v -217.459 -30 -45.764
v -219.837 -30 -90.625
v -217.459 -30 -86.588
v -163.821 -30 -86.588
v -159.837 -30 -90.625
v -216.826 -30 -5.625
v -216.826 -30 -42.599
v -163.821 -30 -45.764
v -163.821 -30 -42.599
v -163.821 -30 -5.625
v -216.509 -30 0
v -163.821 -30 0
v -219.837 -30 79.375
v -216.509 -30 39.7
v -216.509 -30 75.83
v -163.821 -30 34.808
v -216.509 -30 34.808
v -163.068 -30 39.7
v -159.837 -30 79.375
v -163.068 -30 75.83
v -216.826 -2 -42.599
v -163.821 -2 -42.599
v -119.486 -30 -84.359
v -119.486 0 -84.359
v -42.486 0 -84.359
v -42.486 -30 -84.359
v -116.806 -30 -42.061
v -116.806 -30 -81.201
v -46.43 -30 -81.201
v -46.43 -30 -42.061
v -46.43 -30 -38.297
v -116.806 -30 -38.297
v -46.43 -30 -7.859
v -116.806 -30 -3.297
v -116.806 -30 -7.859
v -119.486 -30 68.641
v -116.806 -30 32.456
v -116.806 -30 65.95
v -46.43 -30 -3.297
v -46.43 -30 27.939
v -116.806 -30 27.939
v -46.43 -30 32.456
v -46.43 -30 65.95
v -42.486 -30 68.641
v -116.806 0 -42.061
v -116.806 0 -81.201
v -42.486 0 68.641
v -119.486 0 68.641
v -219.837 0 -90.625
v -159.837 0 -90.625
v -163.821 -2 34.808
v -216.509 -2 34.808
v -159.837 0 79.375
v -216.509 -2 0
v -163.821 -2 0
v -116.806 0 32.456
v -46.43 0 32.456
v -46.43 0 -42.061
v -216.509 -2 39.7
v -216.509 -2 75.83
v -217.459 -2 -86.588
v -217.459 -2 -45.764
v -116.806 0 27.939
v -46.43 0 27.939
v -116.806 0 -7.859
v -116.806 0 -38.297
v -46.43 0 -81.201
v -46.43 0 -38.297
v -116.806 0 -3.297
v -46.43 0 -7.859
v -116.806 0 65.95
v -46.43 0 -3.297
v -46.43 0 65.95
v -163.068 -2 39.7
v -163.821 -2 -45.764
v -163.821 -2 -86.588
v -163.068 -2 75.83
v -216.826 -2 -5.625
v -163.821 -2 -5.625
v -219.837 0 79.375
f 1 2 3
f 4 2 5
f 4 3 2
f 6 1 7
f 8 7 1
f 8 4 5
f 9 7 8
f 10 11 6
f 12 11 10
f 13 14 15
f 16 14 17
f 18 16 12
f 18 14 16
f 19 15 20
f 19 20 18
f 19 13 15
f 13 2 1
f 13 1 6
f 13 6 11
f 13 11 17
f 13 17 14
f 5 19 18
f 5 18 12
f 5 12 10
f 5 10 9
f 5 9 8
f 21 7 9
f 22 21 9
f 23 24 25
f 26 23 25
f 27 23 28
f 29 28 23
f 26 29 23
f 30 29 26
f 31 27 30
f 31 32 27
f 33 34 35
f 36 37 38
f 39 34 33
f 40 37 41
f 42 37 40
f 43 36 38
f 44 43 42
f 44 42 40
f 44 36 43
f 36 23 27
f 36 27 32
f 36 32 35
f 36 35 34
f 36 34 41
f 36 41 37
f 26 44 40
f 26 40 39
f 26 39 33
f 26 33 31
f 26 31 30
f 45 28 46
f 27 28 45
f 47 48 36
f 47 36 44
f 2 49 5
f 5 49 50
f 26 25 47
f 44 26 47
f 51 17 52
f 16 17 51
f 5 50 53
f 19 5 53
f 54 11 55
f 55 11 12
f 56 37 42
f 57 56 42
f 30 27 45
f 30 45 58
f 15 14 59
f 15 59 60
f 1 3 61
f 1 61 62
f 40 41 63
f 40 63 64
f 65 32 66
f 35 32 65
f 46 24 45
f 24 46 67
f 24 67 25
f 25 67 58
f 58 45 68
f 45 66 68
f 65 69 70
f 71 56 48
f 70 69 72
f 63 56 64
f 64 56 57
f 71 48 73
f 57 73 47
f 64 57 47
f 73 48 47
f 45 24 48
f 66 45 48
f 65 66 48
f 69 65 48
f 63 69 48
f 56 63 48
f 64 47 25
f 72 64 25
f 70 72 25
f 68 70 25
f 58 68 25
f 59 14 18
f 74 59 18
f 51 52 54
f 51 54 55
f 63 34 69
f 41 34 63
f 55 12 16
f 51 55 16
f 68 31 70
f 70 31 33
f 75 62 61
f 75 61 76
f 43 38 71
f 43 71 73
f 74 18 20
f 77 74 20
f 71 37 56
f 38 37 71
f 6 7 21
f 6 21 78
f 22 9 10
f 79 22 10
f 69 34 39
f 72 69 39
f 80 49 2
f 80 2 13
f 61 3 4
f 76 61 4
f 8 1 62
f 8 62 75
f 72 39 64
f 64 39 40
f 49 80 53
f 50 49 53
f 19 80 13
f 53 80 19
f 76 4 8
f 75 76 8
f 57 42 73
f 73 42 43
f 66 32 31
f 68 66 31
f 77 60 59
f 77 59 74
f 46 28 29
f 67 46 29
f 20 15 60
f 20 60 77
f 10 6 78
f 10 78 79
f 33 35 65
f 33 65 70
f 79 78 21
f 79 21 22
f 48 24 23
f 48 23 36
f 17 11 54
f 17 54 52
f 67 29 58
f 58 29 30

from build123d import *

# Parameters (mm, degrees)
F0_W     = 60
F0_H     = 170
F1_DEPTH = 30
F2_W     = 53.441137
F2_H     = 36.129229
F2_W_2   = 52.688449
F2_H_2   = 34.807842
F2_W_3   = 53.00492
F2_H_3   = 36.974358
F2_W_4   = 53.637862
F2_H_4   = 40.824387
F3_DEPTH = 28
F4_W     = 77
F4_H     = 153
F5_DEPTH = 30
F6_W     = 70.376717
F6_H     = 33.4948
F6_H_2   = 31.236724
F6_H_3   = 30.438377
F6_H_4   = 39.13999
F7_DEPTH = 30


with BuildPart() as f1:
    # F0 (on Front) → F1 (new body)
    with BuildSketch(Plane.XZ):
        with Locations((-189.837261, -5.624914)):
            Rectangle(F0_W, F0_H)
    extrude(amount=F1_DEPTH)

    # F2 (on face) → F3 (cut)
    with BuildSketch(Plane.XZ.offset(30)):
        with Locations((-189.788923, 57.764958)):
            Rectangle(F2_W, F2_H)
        with Locations((-190.165267, 17.403921)):
            Rectangle(F2_W_2, F2_H_2)
        with Locations((-190.323502, -24.112093)):
            Rectangle(F2_W_3, F2_H_3)
        with Locations((-190.639973, -66.176144)):
            Rectangle(F2_W_4, F2_H_4)
    extrude(amount=-F3_DEPTH, mode=Mode.SUBTRACT)


with BuildPart() as f5:
    # F4 (on Front) → F5 (new body)
    with BuildSketch(Plane.XZ):
        with Locations((-80.986474, -7.859042)):
            Rectangle(F4_W, F4_H)
    extrude(amount=F5_DEPTH)

    # F6 (on face) → F7 (cut)
    with BuildSketch(Plane.XZ.offset(30)):
        with Locations((-81.618015, 49.203046)):
            Rectangle(F6_W, F6_H)
        with Locations((-81.618015, 12.321129)):
            Rectangle(F6_W, F6_H_2)
        with Locations((-81.618015, -23.078231)):
            Rectangle(F6_W, F6_H_3)
        with Locations((-81.618015, -61.630873)):
            Rectangle(F6_W, F6_H_4)
    extrude(amount=-F7_DEPTH, mode=Mode.SUBTRACT)


solid = Compound([f1.part, f5.part])
